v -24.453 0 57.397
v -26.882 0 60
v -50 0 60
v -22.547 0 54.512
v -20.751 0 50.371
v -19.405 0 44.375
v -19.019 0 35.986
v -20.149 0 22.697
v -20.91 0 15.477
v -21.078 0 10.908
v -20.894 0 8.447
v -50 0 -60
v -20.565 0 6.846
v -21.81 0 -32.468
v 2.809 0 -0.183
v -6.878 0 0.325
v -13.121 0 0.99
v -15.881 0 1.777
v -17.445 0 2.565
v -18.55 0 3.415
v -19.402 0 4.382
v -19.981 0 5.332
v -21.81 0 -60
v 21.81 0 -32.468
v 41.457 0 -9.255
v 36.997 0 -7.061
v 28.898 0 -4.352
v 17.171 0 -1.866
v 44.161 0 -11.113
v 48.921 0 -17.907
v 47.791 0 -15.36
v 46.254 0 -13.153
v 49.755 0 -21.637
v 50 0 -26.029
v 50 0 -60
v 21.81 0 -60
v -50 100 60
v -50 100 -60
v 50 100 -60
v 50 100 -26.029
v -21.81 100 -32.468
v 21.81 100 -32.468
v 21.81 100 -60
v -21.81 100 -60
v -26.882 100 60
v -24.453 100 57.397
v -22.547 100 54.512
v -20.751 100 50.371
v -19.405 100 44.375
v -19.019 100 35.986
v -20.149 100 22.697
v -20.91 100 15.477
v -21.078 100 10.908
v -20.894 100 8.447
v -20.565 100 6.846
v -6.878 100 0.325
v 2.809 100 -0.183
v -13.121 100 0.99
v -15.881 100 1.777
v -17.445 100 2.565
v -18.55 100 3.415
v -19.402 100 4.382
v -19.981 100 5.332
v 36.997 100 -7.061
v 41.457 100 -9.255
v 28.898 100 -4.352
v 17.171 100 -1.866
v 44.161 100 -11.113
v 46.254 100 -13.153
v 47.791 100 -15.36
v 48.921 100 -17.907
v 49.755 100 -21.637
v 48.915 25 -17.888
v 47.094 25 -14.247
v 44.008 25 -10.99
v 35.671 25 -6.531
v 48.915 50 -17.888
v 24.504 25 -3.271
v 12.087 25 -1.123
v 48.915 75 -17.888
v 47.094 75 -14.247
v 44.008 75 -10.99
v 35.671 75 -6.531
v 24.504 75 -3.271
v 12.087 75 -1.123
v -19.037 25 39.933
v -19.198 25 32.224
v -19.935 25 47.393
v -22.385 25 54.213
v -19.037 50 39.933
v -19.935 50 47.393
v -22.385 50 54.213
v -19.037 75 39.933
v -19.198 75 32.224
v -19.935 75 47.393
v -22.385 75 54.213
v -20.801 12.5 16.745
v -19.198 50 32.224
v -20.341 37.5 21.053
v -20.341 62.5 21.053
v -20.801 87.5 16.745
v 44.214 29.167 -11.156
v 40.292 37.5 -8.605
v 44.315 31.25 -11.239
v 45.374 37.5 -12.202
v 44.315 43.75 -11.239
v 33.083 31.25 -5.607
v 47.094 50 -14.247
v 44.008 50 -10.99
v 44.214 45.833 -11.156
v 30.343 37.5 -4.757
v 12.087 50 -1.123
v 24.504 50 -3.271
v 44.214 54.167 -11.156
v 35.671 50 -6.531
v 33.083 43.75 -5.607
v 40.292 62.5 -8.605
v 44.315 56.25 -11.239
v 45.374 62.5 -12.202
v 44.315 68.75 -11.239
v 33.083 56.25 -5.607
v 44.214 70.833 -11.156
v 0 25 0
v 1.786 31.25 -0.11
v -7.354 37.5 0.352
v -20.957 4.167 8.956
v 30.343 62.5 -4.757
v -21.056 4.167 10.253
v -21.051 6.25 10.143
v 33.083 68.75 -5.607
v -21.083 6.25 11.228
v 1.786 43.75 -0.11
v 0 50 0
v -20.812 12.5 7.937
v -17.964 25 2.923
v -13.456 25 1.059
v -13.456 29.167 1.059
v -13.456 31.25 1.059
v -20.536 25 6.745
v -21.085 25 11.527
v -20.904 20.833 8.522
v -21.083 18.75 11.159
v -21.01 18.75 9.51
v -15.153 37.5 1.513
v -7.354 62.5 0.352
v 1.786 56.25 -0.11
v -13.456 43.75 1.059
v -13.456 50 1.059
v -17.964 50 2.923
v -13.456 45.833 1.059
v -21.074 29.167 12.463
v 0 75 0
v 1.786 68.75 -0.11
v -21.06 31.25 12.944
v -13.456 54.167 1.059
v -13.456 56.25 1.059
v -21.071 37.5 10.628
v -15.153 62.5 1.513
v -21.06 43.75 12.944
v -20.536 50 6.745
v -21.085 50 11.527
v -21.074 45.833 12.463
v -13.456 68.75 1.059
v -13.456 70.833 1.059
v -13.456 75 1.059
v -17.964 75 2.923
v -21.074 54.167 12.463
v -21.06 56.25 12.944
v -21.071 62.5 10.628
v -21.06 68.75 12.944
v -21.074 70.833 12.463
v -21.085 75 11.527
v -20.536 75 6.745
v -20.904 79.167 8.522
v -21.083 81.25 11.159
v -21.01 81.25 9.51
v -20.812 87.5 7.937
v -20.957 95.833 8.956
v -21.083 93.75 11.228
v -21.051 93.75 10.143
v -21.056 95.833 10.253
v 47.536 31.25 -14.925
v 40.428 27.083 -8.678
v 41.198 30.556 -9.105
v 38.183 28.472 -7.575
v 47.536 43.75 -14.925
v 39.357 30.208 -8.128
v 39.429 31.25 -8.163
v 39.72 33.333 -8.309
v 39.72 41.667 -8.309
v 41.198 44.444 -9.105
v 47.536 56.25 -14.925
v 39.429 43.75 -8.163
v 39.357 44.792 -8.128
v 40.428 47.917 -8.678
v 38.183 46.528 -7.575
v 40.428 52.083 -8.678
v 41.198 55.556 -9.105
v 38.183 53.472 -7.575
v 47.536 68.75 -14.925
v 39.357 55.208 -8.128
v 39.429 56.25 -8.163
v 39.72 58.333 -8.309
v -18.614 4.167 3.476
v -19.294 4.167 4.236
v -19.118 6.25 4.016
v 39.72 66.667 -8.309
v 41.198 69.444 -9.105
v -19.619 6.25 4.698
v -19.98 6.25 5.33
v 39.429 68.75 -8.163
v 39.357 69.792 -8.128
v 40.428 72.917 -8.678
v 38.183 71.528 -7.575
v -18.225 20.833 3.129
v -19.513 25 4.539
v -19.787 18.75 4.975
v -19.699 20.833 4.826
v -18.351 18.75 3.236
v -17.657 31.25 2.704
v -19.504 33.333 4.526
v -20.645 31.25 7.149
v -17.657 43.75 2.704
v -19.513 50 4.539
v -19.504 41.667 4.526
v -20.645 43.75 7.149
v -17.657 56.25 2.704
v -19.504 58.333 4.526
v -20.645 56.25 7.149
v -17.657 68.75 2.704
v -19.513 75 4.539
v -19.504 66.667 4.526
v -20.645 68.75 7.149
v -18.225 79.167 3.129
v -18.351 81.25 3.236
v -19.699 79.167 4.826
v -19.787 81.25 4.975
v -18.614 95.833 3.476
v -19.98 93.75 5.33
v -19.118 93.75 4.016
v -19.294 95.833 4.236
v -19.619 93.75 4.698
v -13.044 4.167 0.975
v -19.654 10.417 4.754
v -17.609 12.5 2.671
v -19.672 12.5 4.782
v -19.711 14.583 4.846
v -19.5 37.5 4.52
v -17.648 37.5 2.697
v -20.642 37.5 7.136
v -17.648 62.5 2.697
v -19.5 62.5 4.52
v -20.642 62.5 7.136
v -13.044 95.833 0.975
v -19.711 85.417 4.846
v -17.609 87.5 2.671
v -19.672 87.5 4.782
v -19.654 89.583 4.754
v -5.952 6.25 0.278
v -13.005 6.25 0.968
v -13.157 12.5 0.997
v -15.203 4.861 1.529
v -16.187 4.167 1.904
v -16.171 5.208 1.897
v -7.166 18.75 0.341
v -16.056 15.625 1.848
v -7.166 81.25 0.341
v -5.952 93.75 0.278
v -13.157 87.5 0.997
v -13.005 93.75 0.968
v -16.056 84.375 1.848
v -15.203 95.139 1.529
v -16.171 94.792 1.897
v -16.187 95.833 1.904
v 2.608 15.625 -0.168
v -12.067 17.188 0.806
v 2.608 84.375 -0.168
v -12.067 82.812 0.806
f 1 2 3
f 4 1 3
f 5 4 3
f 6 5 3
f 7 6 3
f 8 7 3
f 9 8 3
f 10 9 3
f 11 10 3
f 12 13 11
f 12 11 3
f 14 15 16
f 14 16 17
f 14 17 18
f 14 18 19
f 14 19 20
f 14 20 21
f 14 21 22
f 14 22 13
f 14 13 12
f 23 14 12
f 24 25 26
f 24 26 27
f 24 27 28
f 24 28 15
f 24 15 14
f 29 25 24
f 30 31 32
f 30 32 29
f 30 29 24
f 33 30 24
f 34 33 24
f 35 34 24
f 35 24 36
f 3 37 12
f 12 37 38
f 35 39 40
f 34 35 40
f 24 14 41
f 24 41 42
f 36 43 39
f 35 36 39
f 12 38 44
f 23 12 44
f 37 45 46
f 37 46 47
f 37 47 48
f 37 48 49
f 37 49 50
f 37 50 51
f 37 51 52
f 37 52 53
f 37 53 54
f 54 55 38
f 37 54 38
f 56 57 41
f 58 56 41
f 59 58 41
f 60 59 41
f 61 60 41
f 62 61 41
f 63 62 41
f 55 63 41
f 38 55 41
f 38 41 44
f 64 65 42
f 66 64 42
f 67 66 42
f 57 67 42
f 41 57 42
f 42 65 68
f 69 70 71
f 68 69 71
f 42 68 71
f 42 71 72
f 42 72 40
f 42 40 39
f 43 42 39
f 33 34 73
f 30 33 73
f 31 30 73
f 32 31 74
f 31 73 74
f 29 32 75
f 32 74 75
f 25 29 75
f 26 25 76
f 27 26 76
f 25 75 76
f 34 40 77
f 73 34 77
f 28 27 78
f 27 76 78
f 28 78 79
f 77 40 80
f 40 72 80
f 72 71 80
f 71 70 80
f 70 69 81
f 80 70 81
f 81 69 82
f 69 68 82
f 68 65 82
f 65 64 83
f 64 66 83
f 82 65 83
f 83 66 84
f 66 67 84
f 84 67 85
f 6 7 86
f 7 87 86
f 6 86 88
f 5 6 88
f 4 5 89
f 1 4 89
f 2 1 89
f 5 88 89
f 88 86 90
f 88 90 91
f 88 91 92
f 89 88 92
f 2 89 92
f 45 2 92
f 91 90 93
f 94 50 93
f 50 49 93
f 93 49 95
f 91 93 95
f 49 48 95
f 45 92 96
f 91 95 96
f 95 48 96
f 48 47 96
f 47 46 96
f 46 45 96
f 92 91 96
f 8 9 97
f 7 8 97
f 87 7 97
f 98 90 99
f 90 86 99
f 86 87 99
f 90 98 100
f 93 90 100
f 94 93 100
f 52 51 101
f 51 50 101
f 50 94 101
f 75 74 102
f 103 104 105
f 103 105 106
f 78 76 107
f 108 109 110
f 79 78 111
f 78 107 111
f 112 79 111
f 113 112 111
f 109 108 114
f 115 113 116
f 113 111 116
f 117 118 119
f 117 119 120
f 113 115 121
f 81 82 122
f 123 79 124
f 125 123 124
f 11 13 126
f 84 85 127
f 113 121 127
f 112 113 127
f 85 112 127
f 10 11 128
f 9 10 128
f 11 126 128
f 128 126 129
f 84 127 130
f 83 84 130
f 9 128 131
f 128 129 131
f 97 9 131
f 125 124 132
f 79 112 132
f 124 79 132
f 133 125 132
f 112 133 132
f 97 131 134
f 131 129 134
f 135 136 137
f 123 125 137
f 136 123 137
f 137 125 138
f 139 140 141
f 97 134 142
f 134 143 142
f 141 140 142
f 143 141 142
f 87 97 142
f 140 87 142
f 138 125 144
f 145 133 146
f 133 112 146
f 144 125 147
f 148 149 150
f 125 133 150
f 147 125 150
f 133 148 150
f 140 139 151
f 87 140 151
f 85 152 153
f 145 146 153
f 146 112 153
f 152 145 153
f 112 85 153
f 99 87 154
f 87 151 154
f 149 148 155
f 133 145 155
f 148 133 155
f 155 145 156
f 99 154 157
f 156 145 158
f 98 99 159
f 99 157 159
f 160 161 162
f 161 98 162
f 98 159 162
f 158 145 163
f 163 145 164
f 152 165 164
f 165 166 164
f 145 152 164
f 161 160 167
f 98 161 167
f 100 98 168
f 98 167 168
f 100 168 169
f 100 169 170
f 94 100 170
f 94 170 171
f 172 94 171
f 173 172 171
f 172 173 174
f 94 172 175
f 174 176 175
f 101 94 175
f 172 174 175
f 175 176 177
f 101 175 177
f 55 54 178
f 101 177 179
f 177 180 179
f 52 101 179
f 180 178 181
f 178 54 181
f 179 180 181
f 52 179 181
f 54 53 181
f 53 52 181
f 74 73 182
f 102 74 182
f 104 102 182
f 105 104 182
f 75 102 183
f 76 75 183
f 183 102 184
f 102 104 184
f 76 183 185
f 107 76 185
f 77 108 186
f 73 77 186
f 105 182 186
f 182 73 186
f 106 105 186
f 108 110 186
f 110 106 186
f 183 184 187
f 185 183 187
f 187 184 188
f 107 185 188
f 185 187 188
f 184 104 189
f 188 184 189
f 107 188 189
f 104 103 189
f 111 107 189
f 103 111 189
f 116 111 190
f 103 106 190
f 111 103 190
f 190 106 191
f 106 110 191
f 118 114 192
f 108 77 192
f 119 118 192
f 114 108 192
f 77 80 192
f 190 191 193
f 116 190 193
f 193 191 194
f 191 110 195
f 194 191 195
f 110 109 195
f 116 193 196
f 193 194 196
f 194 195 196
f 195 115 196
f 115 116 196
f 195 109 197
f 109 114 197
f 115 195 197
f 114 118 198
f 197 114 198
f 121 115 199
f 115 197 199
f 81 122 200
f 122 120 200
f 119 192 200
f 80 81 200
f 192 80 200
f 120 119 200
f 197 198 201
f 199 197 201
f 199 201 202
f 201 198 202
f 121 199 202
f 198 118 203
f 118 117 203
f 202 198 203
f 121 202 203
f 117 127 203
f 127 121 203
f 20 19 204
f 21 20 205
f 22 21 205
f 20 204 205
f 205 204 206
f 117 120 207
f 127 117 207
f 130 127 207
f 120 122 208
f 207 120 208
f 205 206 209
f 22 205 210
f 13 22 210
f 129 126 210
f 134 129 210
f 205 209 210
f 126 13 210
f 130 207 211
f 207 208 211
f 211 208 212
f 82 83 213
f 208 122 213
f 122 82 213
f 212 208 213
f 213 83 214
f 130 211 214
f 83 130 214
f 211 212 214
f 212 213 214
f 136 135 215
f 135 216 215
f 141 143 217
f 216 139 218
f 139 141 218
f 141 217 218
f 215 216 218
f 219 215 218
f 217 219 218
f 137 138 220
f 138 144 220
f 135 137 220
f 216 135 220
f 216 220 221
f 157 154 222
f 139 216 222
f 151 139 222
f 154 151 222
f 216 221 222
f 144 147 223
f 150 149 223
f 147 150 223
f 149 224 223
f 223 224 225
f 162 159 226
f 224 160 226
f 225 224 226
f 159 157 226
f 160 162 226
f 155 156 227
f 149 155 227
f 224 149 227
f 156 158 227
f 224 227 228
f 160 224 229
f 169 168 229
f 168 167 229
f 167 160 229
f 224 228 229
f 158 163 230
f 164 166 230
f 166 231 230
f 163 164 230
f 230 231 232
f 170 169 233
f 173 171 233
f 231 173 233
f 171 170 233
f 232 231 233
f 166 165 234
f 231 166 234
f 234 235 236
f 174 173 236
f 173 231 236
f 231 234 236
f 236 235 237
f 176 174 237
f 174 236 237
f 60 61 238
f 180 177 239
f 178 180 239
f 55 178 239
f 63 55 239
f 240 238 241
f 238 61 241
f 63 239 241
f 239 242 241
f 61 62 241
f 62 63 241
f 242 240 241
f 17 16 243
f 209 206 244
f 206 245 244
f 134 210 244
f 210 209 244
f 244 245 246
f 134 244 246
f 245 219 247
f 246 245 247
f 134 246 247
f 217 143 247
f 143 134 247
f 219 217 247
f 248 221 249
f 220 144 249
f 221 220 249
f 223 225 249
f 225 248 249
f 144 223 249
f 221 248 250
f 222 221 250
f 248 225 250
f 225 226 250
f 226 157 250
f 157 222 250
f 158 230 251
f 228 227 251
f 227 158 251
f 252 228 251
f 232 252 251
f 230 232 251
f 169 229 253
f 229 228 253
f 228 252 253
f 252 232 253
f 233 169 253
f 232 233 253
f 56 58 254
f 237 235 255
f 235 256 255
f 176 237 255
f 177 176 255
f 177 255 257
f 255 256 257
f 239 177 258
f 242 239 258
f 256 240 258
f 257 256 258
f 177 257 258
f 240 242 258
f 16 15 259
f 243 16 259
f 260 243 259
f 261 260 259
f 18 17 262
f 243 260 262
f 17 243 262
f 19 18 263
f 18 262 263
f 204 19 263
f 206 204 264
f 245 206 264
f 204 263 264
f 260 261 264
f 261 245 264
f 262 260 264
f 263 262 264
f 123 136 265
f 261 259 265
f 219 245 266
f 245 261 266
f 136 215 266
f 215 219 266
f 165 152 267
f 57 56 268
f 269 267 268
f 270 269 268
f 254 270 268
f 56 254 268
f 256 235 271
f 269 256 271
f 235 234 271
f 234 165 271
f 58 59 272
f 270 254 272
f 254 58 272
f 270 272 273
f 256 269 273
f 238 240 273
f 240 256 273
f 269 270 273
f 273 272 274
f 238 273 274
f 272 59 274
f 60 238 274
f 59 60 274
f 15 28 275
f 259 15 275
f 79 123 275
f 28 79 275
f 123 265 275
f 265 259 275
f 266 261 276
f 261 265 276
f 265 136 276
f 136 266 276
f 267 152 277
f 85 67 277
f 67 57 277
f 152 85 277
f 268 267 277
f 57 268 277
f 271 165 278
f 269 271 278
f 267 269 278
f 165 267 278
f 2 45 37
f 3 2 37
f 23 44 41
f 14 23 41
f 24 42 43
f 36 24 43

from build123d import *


with BuildPart() as f2:
    # F2: sweep along a path in F1
    with BuildLine(Plane.XY) as f2_path:
        Line((-30.4791685194, 0), (-30.4791685194, 100))
    # F0 (on Front) → F2 (sweep)
    with BuildSketch(Plane.XZ):
        with BuildLine():
            Line((21.8097008765, -60), (50, -60))
            Line((50, -60), (50, -26.0291449229))
            add(Edge.make_bspline(
                [(-26.8818349299, 60), (-11.7228051932, 46.2937986543), (-31.2466336511, -0.9604997543), (1.1890247146, 1.4610274991), (47.6008776822, -6.2097485311), (50, -20.3193232005), (50, -26.0291449229)],
                knots=[0, 0, 0, 0, 0.3221745777, 0.5267055325, 0.8229951481, 1, 1, 1, 1], degree=3))
            Line((-26.8818349299, 60), (-50, 60))
            Line((-50, 60), (-50, -60))
            Line((-50, -60), (-21.8097008765, -60))
            Line((-21.8097008765, -60), (-21.8097008765, -32.4681201577))
            Line((-21.8097008765, -32.4681201577), (21.8097008765, -32.4681201577))
            Line((21.8097008765, -32.4681201577), (21.8097008765, -60))
        make_face()
    sweep(path=f2_path.line)


solid = f2.part
